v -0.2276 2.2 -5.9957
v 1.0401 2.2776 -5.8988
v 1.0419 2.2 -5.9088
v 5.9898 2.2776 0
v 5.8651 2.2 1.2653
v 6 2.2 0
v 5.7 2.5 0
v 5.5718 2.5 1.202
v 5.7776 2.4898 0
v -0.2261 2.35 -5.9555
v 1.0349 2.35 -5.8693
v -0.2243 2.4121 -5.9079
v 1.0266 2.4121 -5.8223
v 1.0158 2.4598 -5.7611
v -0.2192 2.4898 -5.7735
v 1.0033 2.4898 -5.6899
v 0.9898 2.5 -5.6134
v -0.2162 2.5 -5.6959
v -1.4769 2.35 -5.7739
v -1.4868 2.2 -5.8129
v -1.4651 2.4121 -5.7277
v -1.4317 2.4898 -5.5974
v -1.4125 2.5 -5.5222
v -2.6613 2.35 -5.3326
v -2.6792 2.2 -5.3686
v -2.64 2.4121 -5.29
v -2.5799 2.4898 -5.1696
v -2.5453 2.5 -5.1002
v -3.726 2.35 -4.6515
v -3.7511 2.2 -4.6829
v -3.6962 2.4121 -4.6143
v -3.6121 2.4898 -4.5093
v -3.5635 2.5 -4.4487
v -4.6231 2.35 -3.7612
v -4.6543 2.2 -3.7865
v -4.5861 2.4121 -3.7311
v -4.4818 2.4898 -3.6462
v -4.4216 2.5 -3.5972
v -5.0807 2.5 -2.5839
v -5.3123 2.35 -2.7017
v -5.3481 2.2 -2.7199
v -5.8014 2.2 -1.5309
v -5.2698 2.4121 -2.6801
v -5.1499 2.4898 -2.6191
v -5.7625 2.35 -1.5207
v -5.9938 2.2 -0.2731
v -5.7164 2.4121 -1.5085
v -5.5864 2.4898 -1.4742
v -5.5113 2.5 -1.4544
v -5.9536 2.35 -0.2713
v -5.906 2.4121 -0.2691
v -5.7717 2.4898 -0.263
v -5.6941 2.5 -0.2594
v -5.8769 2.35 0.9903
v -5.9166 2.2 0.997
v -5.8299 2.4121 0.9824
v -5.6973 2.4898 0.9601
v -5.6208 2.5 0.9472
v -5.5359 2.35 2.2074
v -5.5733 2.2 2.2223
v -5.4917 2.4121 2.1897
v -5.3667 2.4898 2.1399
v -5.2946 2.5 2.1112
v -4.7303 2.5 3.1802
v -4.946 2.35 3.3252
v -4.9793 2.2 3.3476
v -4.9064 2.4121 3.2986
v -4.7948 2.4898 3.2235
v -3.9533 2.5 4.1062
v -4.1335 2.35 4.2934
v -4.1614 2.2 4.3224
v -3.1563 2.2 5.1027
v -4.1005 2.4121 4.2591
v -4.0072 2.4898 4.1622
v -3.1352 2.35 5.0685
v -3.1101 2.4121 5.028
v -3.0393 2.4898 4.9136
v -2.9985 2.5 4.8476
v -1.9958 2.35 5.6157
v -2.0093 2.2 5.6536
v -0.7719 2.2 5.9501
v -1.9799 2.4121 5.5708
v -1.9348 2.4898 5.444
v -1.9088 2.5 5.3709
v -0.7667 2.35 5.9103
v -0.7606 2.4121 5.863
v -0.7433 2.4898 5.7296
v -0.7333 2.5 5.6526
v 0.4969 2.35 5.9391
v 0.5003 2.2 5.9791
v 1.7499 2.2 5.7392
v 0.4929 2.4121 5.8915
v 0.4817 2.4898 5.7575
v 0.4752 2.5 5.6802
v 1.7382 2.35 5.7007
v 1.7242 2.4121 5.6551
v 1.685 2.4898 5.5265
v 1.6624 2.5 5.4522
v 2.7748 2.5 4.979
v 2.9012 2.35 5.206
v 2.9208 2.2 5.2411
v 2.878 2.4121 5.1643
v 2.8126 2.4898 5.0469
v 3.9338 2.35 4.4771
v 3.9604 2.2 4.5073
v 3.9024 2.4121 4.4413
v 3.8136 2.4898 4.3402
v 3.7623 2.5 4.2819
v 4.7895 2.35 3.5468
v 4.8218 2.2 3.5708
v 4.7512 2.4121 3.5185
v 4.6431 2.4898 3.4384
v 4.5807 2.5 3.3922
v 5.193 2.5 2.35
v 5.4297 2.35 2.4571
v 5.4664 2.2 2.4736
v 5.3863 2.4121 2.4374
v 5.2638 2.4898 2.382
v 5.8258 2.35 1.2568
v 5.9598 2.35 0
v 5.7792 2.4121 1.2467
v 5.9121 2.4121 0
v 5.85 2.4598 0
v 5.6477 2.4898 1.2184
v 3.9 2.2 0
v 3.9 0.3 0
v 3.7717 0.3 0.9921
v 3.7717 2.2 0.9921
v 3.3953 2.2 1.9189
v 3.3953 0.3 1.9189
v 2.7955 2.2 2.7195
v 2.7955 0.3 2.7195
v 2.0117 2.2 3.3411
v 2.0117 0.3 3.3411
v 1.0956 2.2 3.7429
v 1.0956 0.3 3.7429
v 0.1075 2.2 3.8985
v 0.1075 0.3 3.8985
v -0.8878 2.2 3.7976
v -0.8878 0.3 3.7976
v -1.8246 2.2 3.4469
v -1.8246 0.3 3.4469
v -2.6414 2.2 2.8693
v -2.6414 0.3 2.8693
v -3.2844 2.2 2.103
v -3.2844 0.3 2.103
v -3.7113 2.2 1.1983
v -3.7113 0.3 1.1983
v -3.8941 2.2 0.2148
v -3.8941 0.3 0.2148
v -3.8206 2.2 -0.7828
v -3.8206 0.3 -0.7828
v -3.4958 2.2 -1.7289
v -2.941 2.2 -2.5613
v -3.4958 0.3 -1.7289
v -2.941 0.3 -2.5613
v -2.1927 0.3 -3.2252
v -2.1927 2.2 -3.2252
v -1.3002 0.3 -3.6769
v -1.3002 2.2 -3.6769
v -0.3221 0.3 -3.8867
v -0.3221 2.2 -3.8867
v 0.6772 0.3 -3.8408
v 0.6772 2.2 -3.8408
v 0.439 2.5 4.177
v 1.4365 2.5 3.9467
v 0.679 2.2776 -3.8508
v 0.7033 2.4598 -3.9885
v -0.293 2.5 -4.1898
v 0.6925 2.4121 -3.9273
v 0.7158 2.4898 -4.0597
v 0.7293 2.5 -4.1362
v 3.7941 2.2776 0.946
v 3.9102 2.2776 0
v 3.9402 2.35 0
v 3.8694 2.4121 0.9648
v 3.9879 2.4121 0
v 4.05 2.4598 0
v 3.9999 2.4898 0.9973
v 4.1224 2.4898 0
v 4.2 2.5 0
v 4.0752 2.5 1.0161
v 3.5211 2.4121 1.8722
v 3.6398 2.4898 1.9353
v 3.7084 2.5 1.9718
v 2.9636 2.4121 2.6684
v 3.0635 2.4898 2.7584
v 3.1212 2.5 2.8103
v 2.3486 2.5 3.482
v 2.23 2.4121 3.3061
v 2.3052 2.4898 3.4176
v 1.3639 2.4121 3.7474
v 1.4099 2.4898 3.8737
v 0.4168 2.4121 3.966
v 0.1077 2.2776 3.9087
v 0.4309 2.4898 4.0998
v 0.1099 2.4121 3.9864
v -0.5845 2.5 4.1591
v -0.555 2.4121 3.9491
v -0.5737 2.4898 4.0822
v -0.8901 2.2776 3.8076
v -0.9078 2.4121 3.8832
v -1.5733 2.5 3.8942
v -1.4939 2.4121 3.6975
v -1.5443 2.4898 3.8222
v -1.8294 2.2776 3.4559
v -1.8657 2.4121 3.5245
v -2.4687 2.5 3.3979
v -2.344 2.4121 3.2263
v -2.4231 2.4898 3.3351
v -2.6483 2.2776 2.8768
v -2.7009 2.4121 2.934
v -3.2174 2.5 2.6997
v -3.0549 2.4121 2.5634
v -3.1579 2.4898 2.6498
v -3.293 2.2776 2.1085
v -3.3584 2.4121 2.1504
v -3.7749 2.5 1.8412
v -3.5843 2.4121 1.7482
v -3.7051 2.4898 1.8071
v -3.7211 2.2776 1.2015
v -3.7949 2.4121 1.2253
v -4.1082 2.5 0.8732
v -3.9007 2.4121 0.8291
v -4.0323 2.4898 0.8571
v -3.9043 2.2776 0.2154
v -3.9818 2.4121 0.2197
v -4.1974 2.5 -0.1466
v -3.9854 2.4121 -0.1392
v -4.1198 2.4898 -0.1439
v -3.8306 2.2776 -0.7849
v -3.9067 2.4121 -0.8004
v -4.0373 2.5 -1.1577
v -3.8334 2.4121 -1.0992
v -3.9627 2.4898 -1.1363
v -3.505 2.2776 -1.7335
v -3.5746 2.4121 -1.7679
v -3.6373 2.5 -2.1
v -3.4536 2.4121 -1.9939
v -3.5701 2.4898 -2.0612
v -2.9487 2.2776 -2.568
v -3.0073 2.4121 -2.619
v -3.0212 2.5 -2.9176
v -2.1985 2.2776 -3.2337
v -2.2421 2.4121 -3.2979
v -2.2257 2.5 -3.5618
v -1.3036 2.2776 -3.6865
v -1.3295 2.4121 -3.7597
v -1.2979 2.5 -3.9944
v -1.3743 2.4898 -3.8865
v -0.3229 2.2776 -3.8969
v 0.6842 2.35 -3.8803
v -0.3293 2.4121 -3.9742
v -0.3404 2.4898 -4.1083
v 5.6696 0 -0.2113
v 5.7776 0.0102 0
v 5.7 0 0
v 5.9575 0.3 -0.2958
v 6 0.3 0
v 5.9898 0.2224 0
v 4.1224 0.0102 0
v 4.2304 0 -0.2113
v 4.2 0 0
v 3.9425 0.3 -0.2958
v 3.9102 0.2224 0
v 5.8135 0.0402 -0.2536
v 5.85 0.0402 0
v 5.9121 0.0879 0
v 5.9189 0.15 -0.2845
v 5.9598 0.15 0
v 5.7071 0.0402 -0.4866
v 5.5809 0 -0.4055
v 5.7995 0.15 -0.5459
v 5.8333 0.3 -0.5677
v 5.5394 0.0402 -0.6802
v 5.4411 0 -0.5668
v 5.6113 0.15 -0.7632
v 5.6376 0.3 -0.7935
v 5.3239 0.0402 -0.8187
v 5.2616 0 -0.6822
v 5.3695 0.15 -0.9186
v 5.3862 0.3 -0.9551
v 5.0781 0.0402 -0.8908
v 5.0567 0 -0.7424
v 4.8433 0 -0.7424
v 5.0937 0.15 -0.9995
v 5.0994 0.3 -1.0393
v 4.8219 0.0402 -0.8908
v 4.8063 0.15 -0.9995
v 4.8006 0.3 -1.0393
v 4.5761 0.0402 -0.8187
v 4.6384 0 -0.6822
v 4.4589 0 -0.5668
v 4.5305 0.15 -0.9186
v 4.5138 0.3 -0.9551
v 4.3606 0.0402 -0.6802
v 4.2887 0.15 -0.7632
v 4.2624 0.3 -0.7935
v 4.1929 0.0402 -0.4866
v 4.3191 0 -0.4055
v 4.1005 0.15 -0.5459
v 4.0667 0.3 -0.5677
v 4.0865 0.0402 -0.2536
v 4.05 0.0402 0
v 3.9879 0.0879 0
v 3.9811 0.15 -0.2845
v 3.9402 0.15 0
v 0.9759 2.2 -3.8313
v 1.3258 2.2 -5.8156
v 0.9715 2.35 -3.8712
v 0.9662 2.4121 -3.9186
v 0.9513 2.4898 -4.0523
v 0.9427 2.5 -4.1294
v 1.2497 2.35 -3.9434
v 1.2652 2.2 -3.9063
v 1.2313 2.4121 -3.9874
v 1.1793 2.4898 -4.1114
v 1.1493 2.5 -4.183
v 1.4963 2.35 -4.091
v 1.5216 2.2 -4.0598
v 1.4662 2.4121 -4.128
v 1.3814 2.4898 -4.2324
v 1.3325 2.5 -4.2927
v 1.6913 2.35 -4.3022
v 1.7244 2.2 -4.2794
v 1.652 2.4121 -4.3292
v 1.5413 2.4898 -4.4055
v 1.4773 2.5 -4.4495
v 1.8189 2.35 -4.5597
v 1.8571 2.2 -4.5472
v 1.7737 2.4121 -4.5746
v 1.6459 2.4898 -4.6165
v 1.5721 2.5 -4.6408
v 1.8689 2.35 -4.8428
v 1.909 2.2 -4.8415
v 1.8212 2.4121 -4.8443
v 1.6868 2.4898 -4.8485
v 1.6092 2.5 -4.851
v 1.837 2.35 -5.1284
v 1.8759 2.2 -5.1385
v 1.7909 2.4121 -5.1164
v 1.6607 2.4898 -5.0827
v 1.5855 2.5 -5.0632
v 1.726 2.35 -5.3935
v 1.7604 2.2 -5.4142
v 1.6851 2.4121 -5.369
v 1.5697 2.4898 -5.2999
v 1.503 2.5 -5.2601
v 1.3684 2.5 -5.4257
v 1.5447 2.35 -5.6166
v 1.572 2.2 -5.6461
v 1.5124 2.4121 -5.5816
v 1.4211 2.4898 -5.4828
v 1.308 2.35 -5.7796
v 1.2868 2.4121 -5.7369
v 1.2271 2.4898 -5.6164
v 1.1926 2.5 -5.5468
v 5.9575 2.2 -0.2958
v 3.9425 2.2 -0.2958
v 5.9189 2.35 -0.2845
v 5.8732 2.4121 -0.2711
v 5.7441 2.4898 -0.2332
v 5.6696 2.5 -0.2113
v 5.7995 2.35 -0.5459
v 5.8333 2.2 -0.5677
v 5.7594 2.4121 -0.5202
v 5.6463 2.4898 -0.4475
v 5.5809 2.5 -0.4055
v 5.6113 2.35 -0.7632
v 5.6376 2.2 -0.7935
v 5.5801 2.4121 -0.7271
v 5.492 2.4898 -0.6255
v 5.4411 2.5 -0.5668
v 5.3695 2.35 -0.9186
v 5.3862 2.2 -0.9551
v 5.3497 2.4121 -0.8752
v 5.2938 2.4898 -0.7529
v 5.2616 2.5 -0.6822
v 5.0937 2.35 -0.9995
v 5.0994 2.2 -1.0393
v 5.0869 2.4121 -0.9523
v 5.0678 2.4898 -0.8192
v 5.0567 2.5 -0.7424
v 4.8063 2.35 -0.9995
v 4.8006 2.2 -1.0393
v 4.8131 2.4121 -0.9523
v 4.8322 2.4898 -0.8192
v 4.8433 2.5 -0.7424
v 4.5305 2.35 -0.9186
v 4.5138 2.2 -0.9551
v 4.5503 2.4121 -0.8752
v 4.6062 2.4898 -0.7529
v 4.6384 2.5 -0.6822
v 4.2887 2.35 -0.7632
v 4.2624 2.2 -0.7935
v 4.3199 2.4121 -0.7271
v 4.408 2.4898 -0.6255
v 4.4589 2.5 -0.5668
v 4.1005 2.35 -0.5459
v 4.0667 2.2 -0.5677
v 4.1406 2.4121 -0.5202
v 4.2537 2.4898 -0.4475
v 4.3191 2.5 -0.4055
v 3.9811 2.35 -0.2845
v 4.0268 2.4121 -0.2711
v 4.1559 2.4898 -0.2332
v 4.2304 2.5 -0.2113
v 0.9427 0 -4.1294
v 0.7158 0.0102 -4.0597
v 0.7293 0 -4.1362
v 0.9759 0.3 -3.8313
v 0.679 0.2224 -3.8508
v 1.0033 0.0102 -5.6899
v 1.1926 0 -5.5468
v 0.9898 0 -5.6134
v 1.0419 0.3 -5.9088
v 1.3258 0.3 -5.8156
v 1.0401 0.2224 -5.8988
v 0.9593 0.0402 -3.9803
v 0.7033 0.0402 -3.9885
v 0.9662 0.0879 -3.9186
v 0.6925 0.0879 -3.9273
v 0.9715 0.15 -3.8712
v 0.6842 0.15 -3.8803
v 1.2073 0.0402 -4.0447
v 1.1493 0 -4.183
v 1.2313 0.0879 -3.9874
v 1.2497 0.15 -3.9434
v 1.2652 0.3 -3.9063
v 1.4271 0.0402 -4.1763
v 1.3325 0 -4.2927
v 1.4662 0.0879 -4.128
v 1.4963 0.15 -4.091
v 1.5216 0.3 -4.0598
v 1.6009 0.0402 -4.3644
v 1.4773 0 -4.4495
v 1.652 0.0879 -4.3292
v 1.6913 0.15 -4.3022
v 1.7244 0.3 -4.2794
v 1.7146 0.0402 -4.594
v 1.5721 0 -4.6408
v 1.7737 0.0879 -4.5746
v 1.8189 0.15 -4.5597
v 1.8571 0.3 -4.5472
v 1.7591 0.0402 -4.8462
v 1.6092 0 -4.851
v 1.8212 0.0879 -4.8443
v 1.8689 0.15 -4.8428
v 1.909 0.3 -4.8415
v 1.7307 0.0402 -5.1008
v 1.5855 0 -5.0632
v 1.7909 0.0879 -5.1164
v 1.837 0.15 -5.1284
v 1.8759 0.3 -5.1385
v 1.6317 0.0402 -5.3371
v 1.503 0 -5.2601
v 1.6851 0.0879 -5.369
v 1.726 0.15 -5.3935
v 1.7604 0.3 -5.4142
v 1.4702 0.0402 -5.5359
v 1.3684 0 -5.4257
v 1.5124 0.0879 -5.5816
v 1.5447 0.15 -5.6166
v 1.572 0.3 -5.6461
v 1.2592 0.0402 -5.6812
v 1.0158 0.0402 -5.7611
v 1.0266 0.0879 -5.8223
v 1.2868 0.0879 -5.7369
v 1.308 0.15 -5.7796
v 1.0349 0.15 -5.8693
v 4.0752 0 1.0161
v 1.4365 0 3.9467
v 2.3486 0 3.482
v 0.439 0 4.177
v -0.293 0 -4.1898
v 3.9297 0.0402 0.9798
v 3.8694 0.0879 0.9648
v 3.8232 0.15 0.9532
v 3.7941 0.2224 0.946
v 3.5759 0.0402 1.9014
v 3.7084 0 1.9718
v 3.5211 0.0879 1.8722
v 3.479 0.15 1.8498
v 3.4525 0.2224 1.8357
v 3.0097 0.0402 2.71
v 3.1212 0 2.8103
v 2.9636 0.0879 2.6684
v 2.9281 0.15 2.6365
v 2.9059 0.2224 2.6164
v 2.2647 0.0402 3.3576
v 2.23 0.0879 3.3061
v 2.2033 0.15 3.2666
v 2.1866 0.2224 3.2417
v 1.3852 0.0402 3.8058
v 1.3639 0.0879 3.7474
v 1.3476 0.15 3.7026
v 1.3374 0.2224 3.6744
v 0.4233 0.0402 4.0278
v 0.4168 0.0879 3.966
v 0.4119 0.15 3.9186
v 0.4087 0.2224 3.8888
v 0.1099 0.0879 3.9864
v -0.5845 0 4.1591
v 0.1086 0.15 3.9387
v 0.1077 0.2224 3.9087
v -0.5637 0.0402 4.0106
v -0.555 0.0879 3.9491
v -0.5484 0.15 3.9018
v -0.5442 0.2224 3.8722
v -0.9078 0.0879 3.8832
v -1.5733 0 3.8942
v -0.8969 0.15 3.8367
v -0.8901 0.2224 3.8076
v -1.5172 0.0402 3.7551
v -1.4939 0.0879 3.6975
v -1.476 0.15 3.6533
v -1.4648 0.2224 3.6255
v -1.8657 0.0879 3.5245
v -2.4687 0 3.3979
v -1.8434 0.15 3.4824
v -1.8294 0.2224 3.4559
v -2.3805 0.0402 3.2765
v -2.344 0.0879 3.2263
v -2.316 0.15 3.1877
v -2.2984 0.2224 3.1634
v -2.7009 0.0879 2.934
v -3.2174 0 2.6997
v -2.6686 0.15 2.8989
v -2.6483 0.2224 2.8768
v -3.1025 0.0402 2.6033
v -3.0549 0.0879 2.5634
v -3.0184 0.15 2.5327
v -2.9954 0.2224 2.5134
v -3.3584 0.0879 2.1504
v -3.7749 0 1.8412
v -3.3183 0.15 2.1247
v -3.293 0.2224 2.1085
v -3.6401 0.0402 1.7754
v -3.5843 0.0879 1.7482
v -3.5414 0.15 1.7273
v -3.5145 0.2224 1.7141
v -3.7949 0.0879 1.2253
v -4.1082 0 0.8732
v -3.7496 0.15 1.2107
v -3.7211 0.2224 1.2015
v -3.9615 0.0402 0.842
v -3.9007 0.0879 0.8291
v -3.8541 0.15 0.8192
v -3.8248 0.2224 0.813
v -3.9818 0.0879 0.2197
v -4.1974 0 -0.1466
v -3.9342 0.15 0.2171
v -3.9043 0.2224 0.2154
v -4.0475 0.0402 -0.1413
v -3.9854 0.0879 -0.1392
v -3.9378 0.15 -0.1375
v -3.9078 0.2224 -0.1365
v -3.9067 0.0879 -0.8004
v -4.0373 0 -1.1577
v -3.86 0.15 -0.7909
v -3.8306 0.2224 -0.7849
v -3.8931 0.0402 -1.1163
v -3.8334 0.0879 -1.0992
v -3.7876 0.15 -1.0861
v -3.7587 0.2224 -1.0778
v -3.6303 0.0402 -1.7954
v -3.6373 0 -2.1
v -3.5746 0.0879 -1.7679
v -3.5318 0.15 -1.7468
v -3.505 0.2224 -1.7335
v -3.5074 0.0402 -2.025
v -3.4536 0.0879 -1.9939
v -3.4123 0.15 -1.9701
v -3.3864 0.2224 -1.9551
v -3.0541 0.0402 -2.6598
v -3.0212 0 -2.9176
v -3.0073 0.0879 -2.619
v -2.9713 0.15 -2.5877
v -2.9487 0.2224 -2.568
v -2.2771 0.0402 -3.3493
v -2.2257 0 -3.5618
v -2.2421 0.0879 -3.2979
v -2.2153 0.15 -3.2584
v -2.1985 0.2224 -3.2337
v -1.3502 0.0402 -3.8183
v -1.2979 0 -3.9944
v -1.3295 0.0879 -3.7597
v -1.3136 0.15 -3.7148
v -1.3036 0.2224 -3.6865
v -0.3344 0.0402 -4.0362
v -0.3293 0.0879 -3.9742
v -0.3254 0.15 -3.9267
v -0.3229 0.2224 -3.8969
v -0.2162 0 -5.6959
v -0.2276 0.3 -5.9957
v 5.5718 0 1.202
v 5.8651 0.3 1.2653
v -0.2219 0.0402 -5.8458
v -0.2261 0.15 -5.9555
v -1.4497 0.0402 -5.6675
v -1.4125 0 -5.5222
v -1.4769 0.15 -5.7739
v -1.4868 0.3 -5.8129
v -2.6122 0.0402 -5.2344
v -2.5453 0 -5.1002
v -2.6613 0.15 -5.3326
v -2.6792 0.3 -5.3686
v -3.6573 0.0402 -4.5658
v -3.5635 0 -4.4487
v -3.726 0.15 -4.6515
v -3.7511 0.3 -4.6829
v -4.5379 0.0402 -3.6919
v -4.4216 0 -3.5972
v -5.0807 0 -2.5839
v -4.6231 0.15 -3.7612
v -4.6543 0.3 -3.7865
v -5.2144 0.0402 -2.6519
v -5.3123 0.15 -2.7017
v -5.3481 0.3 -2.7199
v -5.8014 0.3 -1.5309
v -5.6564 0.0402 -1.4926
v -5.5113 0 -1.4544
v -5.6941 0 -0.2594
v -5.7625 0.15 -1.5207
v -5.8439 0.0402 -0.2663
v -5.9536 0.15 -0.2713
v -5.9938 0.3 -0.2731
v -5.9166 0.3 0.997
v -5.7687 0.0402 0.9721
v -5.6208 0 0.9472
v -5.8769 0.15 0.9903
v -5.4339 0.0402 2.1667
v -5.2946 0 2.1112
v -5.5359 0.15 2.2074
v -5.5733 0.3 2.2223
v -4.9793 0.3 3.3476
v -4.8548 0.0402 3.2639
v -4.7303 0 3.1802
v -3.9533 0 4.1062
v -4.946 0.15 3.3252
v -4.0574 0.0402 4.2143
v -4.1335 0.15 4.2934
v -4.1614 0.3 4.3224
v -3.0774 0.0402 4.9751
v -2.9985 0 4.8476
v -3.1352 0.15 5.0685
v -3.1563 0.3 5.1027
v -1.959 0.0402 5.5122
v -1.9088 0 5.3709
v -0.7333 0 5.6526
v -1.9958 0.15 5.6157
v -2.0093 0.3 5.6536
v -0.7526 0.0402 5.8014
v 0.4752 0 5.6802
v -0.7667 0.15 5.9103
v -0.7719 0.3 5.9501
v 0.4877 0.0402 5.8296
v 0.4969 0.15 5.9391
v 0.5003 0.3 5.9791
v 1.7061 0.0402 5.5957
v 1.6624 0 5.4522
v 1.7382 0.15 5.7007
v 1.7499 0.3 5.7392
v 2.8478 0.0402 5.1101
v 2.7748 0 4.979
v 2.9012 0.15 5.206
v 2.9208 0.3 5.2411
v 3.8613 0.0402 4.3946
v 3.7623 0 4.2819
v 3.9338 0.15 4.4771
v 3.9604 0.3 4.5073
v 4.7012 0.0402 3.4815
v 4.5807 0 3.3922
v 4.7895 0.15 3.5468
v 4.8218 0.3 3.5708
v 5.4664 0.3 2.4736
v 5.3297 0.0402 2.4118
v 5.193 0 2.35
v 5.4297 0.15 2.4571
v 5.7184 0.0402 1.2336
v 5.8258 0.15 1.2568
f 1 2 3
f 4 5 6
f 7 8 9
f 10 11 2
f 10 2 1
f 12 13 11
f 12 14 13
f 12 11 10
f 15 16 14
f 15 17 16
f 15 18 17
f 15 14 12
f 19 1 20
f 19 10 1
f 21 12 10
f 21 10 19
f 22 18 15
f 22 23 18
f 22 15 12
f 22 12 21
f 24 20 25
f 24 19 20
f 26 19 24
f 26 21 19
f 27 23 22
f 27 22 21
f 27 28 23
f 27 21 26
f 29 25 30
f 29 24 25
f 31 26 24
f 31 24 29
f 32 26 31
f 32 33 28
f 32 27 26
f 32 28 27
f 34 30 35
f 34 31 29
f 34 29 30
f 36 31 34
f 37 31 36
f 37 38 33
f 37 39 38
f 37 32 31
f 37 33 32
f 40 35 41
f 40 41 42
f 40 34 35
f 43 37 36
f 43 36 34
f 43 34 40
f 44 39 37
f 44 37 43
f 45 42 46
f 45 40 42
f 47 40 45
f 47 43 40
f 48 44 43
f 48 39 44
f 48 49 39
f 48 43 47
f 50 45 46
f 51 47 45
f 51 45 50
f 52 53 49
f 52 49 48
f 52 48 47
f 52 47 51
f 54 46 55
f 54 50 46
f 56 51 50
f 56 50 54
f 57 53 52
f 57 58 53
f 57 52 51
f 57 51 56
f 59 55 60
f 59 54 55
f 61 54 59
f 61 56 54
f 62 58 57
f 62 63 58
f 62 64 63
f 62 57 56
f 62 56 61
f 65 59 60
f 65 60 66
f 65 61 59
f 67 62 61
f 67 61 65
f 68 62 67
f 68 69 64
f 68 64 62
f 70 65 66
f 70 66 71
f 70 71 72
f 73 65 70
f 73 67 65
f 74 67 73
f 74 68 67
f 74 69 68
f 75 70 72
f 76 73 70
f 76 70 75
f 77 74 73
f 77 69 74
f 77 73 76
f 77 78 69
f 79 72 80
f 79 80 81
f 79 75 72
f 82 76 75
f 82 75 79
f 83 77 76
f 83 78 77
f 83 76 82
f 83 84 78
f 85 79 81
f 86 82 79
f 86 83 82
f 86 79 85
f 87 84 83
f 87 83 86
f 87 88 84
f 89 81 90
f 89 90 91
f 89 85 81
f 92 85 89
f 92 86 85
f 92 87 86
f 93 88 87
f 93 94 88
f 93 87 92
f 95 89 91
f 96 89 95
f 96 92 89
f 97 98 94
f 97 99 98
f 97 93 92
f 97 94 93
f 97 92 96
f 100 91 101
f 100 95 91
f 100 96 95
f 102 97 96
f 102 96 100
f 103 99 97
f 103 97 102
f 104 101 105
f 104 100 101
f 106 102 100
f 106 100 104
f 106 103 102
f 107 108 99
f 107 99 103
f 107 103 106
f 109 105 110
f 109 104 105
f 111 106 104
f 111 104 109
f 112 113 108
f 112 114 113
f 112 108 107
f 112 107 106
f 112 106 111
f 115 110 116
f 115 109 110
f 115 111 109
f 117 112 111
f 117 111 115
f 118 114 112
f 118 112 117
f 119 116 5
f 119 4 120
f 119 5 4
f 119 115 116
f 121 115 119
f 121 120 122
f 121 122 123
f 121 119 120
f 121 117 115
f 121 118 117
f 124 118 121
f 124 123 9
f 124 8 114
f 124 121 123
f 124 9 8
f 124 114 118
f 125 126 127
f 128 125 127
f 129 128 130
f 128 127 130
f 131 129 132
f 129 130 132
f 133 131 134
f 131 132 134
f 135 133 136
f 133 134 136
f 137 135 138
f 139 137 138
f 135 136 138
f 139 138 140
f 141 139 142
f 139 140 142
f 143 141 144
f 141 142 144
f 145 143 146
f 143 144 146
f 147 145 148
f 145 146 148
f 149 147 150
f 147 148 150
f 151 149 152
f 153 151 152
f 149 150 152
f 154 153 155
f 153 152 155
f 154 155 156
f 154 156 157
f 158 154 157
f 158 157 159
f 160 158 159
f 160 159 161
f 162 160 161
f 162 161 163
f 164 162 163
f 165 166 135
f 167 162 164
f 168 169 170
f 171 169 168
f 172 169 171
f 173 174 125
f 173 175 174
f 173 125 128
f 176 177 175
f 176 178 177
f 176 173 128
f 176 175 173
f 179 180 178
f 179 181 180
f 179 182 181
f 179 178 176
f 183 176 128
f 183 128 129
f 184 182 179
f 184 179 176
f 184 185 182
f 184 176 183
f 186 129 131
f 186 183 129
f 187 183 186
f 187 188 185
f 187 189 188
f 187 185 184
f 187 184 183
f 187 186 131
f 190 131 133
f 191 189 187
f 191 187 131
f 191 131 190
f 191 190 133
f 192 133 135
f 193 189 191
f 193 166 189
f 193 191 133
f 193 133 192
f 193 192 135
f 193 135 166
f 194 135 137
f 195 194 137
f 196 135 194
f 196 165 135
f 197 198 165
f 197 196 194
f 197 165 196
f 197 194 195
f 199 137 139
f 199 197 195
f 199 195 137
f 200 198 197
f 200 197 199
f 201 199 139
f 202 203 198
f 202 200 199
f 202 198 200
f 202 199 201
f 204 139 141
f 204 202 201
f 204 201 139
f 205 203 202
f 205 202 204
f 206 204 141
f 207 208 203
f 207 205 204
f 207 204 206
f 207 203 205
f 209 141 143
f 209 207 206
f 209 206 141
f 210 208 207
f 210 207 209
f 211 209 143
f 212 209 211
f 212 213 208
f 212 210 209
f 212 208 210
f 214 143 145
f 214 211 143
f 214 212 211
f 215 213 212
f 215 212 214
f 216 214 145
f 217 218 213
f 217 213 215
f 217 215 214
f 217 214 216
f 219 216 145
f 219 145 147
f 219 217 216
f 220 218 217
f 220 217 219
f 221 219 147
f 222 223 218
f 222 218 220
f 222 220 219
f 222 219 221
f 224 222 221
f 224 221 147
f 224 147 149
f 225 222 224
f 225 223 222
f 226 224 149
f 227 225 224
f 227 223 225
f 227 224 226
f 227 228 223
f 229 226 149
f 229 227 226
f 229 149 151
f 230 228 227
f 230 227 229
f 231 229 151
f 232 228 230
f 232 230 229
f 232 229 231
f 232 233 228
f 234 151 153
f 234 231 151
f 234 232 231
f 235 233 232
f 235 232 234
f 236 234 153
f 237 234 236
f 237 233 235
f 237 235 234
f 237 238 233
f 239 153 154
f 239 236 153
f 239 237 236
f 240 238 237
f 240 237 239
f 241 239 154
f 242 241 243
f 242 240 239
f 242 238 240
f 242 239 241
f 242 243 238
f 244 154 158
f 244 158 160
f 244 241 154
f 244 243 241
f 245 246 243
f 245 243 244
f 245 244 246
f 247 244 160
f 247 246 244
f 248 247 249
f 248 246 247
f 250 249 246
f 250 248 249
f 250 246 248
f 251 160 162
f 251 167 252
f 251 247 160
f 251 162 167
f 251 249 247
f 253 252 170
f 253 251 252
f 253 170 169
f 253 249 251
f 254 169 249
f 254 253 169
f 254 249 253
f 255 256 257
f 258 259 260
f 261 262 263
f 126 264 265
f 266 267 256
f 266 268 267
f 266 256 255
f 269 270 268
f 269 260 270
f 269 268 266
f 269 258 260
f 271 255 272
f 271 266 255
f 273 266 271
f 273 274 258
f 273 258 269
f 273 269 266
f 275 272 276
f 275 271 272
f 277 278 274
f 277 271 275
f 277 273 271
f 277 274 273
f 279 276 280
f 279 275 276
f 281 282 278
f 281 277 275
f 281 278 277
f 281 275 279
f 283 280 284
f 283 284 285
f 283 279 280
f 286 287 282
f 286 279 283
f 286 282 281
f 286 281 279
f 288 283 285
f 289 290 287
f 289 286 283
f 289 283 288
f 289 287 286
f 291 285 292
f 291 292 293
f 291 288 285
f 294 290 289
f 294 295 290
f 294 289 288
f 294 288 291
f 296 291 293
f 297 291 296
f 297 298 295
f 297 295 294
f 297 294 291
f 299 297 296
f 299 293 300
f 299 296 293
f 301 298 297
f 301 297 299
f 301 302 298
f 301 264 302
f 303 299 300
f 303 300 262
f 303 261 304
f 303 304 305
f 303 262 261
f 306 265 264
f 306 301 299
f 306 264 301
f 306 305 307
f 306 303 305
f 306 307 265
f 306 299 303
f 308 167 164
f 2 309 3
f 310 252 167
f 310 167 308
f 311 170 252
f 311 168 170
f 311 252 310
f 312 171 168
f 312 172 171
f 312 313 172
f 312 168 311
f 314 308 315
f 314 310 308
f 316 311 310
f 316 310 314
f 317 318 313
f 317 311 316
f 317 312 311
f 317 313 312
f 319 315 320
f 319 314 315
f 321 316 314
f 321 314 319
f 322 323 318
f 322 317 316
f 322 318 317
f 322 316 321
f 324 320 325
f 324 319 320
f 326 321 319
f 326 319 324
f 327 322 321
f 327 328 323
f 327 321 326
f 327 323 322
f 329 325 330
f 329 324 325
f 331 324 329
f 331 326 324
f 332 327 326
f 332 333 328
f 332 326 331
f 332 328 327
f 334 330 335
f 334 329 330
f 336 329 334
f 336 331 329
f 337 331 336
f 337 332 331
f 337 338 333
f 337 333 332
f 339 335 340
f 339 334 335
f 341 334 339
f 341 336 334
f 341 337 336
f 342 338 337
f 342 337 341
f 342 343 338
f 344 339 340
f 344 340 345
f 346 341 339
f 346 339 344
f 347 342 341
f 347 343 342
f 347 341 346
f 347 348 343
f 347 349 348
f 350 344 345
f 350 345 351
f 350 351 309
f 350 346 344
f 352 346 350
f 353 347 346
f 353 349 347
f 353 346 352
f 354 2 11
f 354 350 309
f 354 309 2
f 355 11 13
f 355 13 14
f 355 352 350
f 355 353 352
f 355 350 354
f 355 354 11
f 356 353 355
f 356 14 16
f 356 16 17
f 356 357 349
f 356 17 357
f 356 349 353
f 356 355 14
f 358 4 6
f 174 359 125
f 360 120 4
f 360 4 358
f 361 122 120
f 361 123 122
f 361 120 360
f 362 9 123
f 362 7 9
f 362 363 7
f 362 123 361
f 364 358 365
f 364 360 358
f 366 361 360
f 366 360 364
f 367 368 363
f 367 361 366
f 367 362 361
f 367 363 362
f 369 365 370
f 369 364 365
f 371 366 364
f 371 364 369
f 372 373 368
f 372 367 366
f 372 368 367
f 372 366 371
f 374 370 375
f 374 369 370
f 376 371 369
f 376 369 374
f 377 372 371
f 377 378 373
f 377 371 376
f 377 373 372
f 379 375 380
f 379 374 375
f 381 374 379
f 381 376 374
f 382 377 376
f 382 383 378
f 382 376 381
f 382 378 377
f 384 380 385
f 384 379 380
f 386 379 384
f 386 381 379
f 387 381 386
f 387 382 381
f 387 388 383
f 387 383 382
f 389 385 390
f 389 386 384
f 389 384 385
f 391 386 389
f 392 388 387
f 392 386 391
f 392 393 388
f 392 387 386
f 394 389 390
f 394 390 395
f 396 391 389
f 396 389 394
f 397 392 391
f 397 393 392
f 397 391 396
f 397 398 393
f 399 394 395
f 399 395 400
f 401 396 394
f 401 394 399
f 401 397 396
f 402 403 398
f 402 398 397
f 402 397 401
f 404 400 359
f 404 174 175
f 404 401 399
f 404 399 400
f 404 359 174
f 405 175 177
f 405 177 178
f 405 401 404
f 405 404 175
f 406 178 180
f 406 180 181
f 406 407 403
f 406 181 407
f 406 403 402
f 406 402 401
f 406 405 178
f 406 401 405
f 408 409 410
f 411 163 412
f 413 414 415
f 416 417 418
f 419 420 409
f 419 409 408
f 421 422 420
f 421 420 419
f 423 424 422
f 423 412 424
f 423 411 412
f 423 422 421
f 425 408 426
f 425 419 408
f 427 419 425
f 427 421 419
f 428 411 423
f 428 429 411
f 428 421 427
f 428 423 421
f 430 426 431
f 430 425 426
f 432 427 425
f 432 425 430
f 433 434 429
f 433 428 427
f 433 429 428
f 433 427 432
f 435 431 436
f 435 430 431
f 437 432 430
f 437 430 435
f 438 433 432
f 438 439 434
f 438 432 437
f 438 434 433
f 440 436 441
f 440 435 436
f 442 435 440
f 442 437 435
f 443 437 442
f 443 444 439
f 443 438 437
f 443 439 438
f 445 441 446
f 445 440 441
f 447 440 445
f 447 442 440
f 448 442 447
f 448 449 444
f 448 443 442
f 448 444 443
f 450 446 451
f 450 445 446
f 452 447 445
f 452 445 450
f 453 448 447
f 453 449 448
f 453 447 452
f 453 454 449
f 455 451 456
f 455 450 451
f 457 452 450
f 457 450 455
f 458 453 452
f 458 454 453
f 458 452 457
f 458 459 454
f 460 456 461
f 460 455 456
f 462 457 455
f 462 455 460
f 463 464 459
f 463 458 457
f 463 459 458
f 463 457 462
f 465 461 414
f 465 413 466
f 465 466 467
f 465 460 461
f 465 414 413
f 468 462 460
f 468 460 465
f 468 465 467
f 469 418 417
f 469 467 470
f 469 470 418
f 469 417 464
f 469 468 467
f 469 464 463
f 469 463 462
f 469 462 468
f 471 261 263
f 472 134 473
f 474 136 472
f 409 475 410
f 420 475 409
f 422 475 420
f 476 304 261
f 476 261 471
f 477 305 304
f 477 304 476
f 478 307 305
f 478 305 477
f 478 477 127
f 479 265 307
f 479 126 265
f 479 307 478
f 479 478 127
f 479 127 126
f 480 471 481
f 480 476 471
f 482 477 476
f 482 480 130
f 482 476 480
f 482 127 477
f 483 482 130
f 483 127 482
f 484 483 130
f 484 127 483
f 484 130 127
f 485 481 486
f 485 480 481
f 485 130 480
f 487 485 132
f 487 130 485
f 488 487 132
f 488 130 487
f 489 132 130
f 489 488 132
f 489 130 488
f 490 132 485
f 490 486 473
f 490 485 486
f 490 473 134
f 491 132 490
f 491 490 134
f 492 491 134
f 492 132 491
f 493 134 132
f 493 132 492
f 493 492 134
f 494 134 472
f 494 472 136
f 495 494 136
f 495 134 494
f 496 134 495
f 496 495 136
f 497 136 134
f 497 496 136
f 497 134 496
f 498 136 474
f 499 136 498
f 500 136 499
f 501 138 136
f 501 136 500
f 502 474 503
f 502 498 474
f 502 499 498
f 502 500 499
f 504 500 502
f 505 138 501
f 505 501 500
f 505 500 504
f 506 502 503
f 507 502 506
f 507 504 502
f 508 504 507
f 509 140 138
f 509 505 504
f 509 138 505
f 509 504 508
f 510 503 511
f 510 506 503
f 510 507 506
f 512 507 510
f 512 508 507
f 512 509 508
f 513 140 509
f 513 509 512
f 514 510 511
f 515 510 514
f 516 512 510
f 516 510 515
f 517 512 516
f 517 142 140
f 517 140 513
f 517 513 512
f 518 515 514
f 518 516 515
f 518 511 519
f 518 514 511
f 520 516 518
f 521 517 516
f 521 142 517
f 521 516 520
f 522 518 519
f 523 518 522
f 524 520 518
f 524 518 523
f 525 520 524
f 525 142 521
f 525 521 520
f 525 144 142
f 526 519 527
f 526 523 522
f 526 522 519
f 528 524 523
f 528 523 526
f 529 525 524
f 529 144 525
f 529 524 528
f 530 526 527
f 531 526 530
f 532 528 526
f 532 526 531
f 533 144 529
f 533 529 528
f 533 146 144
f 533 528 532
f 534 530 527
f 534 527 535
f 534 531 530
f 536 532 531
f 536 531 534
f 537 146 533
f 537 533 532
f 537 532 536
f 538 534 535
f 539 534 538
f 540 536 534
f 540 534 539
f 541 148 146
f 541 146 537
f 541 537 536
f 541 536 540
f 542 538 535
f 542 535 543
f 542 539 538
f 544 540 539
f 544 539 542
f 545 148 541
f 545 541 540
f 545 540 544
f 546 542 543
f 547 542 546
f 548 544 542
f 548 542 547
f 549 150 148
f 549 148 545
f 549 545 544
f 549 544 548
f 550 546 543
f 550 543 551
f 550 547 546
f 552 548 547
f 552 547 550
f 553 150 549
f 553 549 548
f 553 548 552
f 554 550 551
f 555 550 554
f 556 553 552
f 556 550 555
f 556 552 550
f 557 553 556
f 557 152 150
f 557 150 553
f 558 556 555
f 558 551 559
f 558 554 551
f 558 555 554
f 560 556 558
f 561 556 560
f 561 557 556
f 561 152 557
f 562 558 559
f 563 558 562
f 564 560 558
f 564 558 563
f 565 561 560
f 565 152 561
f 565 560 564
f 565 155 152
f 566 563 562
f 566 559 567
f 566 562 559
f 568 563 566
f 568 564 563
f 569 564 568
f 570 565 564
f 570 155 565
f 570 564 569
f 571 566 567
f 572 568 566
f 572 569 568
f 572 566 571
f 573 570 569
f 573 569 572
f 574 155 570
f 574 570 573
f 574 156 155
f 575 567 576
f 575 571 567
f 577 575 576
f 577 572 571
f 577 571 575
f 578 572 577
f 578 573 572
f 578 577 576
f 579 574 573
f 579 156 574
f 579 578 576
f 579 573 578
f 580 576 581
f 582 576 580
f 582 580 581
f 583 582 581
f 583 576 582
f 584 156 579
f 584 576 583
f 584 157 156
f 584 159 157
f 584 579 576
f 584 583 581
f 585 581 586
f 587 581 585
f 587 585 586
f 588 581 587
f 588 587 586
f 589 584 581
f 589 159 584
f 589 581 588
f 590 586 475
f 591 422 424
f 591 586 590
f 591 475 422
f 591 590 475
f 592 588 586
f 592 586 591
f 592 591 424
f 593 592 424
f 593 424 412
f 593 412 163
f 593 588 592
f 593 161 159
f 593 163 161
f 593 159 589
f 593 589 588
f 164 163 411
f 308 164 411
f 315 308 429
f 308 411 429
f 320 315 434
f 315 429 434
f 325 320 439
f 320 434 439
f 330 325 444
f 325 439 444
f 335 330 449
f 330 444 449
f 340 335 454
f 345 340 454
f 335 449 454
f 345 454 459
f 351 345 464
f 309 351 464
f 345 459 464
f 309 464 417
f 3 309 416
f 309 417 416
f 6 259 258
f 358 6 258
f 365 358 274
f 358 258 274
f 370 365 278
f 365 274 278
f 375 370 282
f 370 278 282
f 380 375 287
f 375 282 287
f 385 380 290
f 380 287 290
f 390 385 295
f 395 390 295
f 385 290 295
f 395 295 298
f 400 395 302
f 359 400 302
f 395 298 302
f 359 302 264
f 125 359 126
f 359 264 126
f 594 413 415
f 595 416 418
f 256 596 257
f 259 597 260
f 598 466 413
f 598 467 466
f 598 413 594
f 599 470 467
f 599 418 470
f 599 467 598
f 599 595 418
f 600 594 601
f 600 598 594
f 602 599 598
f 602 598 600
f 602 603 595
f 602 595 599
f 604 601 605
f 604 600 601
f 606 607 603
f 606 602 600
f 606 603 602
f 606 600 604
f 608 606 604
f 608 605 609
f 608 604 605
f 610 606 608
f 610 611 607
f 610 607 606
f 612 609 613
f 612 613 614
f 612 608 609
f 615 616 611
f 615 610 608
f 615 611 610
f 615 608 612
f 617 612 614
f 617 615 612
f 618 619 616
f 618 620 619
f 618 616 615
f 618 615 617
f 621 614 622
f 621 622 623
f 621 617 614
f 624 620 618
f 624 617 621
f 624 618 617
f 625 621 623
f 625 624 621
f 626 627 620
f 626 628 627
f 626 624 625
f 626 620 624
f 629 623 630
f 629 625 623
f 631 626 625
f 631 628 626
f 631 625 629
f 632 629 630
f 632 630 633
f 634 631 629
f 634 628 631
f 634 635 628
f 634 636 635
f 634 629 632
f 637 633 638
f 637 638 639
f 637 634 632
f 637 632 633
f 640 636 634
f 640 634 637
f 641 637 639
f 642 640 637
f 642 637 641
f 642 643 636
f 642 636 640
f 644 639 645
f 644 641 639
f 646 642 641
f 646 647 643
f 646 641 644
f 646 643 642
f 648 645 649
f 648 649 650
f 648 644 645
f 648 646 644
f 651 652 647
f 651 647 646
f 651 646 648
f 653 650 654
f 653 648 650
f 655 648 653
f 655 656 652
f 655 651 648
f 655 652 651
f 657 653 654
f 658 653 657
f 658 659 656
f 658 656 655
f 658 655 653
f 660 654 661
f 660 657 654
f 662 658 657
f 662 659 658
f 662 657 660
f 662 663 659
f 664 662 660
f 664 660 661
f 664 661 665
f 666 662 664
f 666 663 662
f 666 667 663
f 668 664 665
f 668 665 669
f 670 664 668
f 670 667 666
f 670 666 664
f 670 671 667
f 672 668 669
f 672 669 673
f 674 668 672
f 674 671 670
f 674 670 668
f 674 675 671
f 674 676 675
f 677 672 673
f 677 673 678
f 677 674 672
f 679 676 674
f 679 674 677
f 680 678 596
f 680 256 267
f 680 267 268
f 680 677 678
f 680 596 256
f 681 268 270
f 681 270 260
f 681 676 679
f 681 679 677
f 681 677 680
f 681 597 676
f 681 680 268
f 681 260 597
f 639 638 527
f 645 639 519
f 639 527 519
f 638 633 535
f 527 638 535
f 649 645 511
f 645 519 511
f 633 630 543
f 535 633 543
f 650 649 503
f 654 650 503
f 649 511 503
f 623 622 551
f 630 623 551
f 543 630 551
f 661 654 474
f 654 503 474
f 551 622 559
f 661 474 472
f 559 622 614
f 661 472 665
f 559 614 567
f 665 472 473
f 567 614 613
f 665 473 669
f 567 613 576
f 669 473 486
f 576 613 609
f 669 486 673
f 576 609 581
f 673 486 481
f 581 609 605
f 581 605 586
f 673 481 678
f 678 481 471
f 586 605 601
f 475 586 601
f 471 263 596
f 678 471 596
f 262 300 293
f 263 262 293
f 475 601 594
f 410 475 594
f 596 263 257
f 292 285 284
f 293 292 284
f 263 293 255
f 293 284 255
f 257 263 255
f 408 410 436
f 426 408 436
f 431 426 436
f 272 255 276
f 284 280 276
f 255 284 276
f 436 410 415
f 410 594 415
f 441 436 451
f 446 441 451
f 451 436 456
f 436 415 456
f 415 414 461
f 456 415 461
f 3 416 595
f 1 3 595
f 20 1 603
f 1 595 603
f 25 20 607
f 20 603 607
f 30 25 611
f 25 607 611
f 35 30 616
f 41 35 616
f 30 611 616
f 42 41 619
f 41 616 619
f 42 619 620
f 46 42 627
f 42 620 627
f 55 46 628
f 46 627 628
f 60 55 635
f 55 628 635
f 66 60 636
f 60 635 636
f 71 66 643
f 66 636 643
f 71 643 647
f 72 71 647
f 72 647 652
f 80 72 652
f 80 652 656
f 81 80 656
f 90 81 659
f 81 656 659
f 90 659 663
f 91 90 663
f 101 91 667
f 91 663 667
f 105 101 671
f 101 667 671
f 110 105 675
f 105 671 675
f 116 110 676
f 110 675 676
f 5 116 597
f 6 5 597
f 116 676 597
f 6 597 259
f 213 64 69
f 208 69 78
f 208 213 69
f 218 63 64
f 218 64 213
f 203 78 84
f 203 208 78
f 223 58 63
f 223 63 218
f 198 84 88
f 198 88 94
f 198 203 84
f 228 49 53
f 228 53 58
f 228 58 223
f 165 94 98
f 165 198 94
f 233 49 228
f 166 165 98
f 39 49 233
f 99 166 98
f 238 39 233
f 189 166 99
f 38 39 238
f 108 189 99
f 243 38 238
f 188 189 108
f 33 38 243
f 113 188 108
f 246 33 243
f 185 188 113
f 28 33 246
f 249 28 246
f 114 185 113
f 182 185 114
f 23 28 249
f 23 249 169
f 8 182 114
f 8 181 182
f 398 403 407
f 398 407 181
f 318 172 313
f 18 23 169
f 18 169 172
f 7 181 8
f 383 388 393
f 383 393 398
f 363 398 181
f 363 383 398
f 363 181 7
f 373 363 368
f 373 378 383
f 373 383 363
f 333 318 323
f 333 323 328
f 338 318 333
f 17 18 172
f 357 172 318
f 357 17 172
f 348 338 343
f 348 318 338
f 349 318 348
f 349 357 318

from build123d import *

# Parameters (mm, degrees)
BOSS_EXTRUDE1_DEPTH = 2.5
FILLET2_R           = 0.3
FILLET3_R           = 0.3


with BuildPart() as part:
    # Sketch1 → Boss-Extrude1 (new body)
    with BuildSketch(Plane(origin=(0, 0, 0), x_dir=(1, 0, 0), z_dir=(0, 1, 0))):
        with BuildLine():
            ThreePointArc((3.9, 0), (-2.987573328, -2.506871678), (0.677227893, 3.840750237))
            ThreePointArc((0.677227893, 3.840750237), (1.89360662, 4.692467791), (1.041889066, 5.908846518))
            ThreePointArc((1.041889066, 5.908846518), (-4.596266659, -3.856725658), (6, 0))
            ThreePointArc((6, 0), (4.95, 1.05), (3.9, 0))
        make_face()
    extrude(amount=BOSS_EXTRUDE1_DEPTH)

    # Fillet2
    fillet2_edges = [part.edges().sort_by_distance(p)[0] for p in [
        (1.89360662, 2.5, -4.692467791),
        (-4.596266659, 2.5, 3.856725658),
        (4.95, 2.5, -1.05),
        (-2.987573328, 2.5, 2.506871678),
    ]]
    fillet(fillet2_edges, radius=FILLET2_R)

    # Fillet3
    fillet3_edges = [part.edges().sort_by_distance(p)[0] for p in [
        (-4.596266659, 0, 3.856725658),
        (1.89360662, 0, -4.692467791),
        (-2.987573328, 0, 2.506871678),
        (4.95, 0, -1.05),
    ]]
    fillet(fillet3_edges, radius=FILLET3_R)


solid = part.part
